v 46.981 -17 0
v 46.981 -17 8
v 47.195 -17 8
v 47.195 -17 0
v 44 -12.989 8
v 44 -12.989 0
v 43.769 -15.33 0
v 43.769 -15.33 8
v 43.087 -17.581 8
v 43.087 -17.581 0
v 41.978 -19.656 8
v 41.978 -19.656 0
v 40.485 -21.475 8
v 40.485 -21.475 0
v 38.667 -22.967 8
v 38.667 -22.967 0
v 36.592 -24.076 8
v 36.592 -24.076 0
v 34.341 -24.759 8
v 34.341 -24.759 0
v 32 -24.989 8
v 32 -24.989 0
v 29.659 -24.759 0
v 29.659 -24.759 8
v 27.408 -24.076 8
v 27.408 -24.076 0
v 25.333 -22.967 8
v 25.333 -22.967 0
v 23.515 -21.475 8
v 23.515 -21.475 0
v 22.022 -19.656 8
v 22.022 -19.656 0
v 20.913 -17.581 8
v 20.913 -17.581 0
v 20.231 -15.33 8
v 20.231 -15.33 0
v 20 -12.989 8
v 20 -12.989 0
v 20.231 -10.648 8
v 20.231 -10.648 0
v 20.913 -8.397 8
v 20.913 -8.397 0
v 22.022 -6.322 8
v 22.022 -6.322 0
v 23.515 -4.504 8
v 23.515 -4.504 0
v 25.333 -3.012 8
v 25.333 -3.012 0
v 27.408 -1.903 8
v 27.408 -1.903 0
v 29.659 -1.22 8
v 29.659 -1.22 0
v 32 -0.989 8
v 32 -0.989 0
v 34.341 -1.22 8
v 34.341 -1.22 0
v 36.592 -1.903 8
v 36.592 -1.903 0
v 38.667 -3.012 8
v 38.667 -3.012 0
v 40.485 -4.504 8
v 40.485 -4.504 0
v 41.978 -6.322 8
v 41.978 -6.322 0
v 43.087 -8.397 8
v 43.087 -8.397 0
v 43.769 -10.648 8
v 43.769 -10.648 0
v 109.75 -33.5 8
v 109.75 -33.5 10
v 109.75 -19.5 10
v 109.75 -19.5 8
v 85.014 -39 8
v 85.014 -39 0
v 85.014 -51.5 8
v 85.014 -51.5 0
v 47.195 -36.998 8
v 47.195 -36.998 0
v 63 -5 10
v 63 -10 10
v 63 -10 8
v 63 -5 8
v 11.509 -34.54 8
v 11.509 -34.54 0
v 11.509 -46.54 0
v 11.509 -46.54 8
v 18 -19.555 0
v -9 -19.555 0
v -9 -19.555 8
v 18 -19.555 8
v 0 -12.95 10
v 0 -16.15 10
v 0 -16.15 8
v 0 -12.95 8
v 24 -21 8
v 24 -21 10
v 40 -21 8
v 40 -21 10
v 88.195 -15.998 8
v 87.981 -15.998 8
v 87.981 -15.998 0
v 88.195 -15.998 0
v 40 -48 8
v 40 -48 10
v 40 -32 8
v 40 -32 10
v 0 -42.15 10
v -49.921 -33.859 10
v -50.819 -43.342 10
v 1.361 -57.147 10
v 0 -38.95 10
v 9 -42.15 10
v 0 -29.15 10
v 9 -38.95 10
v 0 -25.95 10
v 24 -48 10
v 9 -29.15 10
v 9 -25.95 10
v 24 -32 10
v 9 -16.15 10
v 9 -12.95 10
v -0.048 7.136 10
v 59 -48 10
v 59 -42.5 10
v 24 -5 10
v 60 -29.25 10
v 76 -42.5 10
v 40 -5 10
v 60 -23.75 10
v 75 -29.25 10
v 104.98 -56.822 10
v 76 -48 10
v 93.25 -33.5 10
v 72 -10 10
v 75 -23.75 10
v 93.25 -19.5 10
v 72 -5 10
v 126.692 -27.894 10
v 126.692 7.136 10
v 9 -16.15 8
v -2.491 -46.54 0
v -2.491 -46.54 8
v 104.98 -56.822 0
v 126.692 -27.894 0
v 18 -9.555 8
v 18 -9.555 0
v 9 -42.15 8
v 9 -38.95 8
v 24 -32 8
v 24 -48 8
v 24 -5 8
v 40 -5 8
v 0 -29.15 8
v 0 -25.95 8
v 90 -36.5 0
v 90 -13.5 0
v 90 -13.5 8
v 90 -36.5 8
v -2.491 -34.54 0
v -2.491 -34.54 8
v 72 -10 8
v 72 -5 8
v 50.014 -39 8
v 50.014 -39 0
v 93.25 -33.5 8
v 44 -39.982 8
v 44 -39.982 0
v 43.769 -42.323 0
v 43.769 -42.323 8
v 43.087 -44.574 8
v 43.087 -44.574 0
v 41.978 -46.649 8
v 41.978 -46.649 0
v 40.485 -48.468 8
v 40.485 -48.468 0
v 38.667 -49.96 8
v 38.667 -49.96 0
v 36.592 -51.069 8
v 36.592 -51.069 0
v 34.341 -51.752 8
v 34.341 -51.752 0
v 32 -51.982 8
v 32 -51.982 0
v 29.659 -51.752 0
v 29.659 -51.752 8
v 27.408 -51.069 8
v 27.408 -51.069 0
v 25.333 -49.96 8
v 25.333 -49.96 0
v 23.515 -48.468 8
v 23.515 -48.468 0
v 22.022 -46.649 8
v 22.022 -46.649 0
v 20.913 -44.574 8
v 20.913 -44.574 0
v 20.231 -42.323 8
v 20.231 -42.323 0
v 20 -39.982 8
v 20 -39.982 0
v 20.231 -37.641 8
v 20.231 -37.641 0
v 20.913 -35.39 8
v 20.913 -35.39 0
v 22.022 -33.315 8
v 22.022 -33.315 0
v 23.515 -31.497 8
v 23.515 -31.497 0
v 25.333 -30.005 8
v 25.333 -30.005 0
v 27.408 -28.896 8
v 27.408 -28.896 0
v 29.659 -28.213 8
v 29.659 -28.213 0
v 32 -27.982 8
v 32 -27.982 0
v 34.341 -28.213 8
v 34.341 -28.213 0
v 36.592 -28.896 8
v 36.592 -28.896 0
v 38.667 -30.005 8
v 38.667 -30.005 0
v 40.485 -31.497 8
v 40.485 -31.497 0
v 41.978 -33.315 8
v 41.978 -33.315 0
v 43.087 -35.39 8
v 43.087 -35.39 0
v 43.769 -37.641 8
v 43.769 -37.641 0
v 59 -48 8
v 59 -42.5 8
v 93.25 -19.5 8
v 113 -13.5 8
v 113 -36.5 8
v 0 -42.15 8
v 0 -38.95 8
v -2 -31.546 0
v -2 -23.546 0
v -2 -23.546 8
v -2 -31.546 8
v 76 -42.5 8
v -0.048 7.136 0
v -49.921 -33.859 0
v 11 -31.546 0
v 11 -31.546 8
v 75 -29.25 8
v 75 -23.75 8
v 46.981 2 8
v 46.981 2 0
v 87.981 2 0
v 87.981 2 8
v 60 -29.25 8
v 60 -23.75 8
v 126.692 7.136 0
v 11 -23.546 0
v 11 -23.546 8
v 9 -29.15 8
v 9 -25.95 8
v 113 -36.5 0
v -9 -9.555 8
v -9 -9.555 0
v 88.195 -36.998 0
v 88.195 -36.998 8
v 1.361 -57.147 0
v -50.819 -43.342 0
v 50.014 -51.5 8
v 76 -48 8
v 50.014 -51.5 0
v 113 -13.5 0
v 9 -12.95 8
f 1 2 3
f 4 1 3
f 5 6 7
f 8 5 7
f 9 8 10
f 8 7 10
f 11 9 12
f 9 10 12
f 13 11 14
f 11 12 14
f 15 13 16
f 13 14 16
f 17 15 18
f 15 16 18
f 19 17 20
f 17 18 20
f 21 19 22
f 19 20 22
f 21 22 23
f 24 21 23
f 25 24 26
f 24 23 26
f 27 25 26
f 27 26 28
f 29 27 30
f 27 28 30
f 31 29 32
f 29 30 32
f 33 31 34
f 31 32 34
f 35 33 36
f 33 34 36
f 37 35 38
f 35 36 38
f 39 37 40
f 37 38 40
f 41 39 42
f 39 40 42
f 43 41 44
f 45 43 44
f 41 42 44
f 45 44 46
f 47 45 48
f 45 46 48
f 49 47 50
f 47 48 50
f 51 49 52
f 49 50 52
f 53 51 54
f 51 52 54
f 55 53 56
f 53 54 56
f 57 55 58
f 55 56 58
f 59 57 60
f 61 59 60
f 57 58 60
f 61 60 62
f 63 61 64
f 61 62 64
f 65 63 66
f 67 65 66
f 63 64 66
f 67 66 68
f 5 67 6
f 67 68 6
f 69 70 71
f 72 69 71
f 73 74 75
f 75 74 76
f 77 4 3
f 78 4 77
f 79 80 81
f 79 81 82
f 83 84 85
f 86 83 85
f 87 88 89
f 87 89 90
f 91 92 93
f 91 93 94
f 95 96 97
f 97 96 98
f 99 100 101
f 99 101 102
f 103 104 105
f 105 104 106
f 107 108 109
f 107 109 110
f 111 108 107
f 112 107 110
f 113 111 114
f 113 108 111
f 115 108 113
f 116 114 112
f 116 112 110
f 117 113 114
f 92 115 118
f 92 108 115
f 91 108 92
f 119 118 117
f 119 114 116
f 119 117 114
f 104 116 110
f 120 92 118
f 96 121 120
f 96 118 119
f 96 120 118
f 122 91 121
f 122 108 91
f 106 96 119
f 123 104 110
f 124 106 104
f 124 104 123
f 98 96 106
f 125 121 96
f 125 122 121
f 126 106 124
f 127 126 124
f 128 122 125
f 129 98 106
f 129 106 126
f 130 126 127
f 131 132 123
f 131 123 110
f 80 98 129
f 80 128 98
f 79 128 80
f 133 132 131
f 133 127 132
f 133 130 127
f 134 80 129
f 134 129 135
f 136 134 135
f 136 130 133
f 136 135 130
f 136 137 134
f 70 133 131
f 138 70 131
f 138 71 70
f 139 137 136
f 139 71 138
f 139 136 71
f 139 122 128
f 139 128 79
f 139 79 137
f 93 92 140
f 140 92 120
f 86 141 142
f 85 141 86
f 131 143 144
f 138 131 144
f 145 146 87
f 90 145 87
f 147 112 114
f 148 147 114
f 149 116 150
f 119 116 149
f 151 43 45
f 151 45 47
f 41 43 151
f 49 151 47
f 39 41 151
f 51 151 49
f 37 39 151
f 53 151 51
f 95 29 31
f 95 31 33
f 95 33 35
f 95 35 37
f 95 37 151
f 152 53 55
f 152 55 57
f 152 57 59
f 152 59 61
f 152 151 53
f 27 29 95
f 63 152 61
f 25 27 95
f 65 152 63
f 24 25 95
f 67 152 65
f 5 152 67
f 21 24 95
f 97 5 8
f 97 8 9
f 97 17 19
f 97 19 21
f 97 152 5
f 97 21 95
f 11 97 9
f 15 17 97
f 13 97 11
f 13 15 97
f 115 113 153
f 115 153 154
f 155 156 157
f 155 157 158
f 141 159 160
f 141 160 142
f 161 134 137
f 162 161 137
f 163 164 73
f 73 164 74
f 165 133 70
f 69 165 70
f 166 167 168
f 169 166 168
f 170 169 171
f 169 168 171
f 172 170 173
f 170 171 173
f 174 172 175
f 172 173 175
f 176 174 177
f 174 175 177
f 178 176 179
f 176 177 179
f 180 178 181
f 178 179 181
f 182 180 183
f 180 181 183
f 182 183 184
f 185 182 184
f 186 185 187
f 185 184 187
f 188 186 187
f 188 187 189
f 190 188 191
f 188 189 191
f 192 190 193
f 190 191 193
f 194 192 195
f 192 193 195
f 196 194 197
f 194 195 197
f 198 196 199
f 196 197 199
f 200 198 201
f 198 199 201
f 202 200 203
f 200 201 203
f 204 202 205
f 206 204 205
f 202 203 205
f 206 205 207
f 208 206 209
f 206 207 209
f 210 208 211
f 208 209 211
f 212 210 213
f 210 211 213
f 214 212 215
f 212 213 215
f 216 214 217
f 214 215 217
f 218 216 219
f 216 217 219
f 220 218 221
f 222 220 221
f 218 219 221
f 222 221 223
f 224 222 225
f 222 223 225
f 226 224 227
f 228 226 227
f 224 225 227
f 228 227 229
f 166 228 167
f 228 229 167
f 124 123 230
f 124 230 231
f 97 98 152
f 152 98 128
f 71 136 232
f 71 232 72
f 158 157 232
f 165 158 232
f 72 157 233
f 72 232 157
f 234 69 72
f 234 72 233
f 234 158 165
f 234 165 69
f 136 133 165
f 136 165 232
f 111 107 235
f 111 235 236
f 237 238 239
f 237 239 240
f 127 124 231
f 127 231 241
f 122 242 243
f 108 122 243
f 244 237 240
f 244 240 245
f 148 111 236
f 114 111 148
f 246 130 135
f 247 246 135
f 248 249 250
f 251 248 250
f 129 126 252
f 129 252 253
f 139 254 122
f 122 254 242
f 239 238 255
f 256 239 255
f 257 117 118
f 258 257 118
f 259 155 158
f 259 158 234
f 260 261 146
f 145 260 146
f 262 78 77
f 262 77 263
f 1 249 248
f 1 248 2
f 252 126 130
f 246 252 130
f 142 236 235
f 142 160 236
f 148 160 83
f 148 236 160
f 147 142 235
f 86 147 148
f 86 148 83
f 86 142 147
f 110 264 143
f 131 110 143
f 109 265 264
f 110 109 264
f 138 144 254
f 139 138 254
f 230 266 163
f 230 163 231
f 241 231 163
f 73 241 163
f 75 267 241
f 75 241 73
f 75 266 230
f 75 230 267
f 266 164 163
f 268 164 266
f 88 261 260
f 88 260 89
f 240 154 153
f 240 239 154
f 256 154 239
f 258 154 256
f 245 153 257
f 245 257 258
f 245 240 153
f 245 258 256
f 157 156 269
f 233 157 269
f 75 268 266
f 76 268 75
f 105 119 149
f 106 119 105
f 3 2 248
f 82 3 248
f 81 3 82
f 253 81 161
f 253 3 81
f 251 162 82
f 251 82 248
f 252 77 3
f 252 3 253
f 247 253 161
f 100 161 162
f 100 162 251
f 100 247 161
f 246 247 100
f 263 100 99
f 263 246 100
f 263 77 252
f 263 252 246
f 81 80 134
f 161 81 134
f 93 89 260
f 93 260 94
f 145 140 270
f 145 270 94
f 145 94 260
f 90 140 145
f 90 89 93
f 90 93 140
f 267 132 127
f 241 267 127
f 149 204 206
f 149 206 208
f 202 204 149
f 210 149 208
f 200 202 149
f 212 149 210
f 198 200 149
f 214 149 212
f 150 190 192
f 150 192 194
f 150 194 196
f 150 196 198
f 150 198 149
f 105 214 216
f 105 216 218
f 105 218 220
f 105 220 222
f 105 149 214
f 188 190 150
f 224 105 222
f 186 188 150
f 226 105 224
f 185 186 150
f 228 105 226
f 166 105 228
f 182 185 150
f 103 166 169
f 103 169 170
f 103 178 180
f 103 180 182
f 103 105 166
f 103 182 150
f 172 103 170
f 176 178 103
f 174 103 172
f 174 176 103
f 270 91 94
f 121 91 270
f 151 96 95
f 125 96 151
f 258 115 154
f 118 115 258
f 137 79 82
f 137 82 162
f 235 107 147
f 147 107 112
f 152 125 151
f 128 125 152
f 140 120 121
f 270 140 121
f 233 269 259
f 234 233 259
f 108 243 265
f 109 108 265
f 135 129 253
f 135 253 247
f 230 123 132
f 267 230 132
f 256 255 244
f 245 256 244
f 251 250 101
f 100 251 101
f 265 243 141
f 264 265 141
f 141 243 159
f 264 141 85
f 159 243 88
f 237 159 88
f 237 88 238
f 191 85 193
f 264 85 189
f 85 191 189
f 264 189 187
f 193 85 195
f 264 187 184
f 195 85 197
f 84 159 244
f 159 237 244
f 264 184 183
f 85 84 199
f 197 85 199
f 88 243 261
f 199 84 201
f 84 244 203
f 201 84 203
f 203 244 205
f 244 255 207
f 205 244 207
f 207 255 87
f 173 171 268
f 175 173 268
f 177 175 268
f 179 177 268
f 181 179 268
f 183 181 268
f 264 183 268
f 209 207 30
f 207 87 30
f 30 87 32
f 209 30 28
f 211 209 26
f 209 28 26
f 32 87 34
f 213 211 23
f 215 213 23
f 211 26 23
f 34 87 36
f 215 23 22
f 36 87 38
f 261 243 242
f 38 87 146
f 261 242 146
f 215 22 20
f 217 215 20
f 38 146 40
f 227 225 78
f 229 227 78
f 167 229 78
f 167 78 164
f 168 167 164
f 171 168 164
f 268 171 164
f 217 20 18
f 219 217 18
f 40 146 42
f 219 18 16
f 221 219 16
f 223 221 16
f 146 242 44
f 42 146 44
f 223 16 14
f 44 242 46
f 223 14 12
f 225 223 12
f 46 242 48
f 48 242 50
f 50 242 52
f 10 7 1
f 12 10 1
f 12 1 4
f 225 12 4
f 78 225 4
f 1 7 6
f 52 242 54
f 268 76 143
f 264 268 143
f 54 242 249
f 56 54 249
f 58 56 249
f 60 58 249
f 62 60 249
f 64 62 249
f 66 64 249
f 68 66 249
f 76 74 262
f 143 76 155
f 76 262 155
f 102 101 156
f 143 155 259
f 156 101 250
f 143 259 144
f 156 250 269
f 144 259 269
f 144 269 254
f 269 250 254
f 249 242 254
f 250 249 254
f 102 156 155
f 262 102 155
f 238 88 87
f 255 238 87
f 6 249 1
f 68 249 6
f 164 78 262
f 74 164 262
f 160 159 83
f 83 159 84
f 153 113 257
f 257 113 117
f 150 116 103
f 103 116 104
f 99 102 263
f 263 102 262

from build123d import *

# Parameters (mm, degrees)
PAD_DEPTH       = 10
SKETCH001_W     = 9
SKETCH001_H     = 3.2
SKETCH001_W_2   = 15
SKETCH001_H_2   = 5.5
SKETCH001_H_3   = 5
SKETCH001_W_3   = 16.5
SKETCH001_H_4   = 14
SKETCH001_W_4   = 16
SKETCH001_H_5   = 16
SKETCH001_W_5   = 17
POCKET_DEPTH    = 2
SKETCH002_R     = 12
POCKET001_DEPTH = 8
SKETCH003_W     = 41
SKETCH003_H     = 19
POCKET002_DEPTH = 8
SKETCH004_W     = 35
SKETCH004_H     = 12.5
POCKET003_DEPTH = 8
SKETCH005_W     = 41
SKETCH005_H     = 21
POCKET004_DEPTH = 8
SKETCH006_W     = 14
SKETCH006_H     = 12
POCKET005_DEPTH = 8
SKETCH007_W     = 13
SKETCH007_H     = 8
POCKET006_DEPTH = 8
SKETCH008_W     = 27
SKETCH008_H     = 10
POCKET007_DEPTH = 8
SKETCH009_W     = 23
SKETCH009_H     = 23
POCKET008_DEPTH = 8


with BuildPart() as part:
    # Sketch → Pad (new body)
    with BuildSketch(Plane.XY):
        Polygon((126.692246, 7.136342), (-0.047754, 7.136342), (-49.921126, -33.859272), (-50.819163, -43.341843), (1.360604, -57.146646), (104.980095, -56.822042), (126.692246, -27.893658), align=None)
    extrude(amount=PAD_DEPTH)

    # Sketch001 (on Face9 of Pad) → Pocket (cut)
    with BuildSketch(Plane.XY.offset(10)):
        with Locations((4.5, -14.55)):
            Rectangle(SKETCH001_W, SKETCH001_H)
        with Locations((4.5, -27.55)):
            Rectangle(SKETCH001_W, SKETCH001_H)
        with Locations((4.5, -40.55)):
            Rectangle(SKETCH001_W, SKETCH001_H)
        with Locations((67.5, -26.5)):
            Rectangle(SKETCH001_W_2, SKETCH001_H_2)
        with Locations((67.5, -7.5)):
            Rectangle(SKETCH001_W, SKETCH001_H_3)
        with Locations((101.5, -26.5)):
            Rectangle(SKETCH001_W_3, SKETCH001_H_4)
        with Locations((32, -13)):
            Rectangle(SKETCH001_W_4, SKETCH001_H_5)
        with Locations((32, -40)):
            Rectangle(SKETCH001_W_4, SKETCH001_H_5)
        with Locations((67.5, -45.25)):
            Rectangle(SKETCH001_W_5, SKETCH001_H_2)
    extrude(amount=-POCKET_DEPTH, mode=Mode.SUBTRACT)

    # Sketch002 (on Face4 of Pocket) → Pocket001 (cut)
    with BuildSketch(Plane(origin=(0, 0, 0), x_dir=(1, 0, 0), z_dir=(0, 0, -1))):
        with Locations((32, 39.982296)):
            Circle(SKETCH002_R)
        with Locations((32, 12.989247)):
            Circle(SKETCH002_R)
    extrude(amount=-POCKET001_DEPTH, mode=Mode.SUBTRACT)

    # Sketch003 (on Face4 of Pocket001) → Pocket002 (cut)
    with BuildSketch(Plane(origin=(0, 0, 0), x_dir=(1, 0, 0), z_dir=(0, 0, -1))):
        with Locations((67.481461, 7.5)):
            Rectangle(SKETCH003_W, SKETCH003_H)
    extrude(amount=-POCKET002_DEPTH, mode=Mode.SUBTRACT)

    # Sketch004 (on Face4 of Pocket002) → Pocket003 (cut)
    with BuildSketch(Plane(origin=(0, 0, 0), x_dir=(1, 0, 0), z_dir=(0, 0, -1))):
        with Locations((67.513935, 45.25)):
            Rectangle(SKETCH004_W, SKETCH004_H)
    extrude(amount=-POCKET003_DEPTH, mode=Mode.SUBTRACT)

    # Sketch005 (on Face4 of Pocket003) → Pocket004 (cut)
    with BuildSketch(Plane(origin=(0, 0, 0), x_dir=(1, 0, 0), z_dir=(0, 0, -1))):
        with Locations((67.69477, 26.497755)):
            Rectangle(SKETCH005_W, SKETCH005_H)
    extrude(amount=-POCKET004_DEPTH, mode=Mode.SUBTRACT)

    # Sketch006 (on Face4 of Pocket004) → Pocket005 (cut)
    with BuildSketch(Plane(origin=(0, 0, 0), x_dir=(1, 0, 0), z_dir=(0, 0, -1))):
        with Locations((4.509145, 40.540194)):
            Rectangle(SKETCH006_W, SKETCH006_H)
    extrude(amount=-POCKET005_DEPTH, mode=Mode.SUBTRACT)

    # Sketch007 (on Face4 of Pocket005) → Pocket006 (cut)
    with BuildSketch(Plane(origin=(0, 0, 0), x_dir=(1, 0, 0), z_dir=(0, 0, -1))):
        with Locations((4.5, 27.545833)):
            Rectangle(SKETCH007_W, SKETCH007_H)
    extrude(amount=-POCKET006_DEPTH, mode=Mode.SUBTRACT)

    # Sketch008 (on Face4 of Pocket006) → Pocket007 (cut)
    with BuildSketch(Plane(origin=(0, 0, 0), x_dir=(1, 0, 0), z_dir=(0, 0, -1))):
        with Locations((4.5, 14.554985)):
            Rectangle(SKETCH008_W, SKETCH008_H)
    extrude(amount=-POCKET007_DEPTH, mode=Mode.SUBTRACT)

    # Sketch009 (on Face4 of Pocket007) → Pocket008 (cut)
    with BuildSketch(Plane(origin=(0, 0, 0), x_dir=(1, 0, 0), z_dir=(0, 0, -1))):
        with Locations((101.5, 25)):
            Rectangle(SKETCH009_W, SKETCH009_H)
    extrude(amount=-POCKET008_DEPTH, mode=Mode.SUBTRACT)


solid = part.part
